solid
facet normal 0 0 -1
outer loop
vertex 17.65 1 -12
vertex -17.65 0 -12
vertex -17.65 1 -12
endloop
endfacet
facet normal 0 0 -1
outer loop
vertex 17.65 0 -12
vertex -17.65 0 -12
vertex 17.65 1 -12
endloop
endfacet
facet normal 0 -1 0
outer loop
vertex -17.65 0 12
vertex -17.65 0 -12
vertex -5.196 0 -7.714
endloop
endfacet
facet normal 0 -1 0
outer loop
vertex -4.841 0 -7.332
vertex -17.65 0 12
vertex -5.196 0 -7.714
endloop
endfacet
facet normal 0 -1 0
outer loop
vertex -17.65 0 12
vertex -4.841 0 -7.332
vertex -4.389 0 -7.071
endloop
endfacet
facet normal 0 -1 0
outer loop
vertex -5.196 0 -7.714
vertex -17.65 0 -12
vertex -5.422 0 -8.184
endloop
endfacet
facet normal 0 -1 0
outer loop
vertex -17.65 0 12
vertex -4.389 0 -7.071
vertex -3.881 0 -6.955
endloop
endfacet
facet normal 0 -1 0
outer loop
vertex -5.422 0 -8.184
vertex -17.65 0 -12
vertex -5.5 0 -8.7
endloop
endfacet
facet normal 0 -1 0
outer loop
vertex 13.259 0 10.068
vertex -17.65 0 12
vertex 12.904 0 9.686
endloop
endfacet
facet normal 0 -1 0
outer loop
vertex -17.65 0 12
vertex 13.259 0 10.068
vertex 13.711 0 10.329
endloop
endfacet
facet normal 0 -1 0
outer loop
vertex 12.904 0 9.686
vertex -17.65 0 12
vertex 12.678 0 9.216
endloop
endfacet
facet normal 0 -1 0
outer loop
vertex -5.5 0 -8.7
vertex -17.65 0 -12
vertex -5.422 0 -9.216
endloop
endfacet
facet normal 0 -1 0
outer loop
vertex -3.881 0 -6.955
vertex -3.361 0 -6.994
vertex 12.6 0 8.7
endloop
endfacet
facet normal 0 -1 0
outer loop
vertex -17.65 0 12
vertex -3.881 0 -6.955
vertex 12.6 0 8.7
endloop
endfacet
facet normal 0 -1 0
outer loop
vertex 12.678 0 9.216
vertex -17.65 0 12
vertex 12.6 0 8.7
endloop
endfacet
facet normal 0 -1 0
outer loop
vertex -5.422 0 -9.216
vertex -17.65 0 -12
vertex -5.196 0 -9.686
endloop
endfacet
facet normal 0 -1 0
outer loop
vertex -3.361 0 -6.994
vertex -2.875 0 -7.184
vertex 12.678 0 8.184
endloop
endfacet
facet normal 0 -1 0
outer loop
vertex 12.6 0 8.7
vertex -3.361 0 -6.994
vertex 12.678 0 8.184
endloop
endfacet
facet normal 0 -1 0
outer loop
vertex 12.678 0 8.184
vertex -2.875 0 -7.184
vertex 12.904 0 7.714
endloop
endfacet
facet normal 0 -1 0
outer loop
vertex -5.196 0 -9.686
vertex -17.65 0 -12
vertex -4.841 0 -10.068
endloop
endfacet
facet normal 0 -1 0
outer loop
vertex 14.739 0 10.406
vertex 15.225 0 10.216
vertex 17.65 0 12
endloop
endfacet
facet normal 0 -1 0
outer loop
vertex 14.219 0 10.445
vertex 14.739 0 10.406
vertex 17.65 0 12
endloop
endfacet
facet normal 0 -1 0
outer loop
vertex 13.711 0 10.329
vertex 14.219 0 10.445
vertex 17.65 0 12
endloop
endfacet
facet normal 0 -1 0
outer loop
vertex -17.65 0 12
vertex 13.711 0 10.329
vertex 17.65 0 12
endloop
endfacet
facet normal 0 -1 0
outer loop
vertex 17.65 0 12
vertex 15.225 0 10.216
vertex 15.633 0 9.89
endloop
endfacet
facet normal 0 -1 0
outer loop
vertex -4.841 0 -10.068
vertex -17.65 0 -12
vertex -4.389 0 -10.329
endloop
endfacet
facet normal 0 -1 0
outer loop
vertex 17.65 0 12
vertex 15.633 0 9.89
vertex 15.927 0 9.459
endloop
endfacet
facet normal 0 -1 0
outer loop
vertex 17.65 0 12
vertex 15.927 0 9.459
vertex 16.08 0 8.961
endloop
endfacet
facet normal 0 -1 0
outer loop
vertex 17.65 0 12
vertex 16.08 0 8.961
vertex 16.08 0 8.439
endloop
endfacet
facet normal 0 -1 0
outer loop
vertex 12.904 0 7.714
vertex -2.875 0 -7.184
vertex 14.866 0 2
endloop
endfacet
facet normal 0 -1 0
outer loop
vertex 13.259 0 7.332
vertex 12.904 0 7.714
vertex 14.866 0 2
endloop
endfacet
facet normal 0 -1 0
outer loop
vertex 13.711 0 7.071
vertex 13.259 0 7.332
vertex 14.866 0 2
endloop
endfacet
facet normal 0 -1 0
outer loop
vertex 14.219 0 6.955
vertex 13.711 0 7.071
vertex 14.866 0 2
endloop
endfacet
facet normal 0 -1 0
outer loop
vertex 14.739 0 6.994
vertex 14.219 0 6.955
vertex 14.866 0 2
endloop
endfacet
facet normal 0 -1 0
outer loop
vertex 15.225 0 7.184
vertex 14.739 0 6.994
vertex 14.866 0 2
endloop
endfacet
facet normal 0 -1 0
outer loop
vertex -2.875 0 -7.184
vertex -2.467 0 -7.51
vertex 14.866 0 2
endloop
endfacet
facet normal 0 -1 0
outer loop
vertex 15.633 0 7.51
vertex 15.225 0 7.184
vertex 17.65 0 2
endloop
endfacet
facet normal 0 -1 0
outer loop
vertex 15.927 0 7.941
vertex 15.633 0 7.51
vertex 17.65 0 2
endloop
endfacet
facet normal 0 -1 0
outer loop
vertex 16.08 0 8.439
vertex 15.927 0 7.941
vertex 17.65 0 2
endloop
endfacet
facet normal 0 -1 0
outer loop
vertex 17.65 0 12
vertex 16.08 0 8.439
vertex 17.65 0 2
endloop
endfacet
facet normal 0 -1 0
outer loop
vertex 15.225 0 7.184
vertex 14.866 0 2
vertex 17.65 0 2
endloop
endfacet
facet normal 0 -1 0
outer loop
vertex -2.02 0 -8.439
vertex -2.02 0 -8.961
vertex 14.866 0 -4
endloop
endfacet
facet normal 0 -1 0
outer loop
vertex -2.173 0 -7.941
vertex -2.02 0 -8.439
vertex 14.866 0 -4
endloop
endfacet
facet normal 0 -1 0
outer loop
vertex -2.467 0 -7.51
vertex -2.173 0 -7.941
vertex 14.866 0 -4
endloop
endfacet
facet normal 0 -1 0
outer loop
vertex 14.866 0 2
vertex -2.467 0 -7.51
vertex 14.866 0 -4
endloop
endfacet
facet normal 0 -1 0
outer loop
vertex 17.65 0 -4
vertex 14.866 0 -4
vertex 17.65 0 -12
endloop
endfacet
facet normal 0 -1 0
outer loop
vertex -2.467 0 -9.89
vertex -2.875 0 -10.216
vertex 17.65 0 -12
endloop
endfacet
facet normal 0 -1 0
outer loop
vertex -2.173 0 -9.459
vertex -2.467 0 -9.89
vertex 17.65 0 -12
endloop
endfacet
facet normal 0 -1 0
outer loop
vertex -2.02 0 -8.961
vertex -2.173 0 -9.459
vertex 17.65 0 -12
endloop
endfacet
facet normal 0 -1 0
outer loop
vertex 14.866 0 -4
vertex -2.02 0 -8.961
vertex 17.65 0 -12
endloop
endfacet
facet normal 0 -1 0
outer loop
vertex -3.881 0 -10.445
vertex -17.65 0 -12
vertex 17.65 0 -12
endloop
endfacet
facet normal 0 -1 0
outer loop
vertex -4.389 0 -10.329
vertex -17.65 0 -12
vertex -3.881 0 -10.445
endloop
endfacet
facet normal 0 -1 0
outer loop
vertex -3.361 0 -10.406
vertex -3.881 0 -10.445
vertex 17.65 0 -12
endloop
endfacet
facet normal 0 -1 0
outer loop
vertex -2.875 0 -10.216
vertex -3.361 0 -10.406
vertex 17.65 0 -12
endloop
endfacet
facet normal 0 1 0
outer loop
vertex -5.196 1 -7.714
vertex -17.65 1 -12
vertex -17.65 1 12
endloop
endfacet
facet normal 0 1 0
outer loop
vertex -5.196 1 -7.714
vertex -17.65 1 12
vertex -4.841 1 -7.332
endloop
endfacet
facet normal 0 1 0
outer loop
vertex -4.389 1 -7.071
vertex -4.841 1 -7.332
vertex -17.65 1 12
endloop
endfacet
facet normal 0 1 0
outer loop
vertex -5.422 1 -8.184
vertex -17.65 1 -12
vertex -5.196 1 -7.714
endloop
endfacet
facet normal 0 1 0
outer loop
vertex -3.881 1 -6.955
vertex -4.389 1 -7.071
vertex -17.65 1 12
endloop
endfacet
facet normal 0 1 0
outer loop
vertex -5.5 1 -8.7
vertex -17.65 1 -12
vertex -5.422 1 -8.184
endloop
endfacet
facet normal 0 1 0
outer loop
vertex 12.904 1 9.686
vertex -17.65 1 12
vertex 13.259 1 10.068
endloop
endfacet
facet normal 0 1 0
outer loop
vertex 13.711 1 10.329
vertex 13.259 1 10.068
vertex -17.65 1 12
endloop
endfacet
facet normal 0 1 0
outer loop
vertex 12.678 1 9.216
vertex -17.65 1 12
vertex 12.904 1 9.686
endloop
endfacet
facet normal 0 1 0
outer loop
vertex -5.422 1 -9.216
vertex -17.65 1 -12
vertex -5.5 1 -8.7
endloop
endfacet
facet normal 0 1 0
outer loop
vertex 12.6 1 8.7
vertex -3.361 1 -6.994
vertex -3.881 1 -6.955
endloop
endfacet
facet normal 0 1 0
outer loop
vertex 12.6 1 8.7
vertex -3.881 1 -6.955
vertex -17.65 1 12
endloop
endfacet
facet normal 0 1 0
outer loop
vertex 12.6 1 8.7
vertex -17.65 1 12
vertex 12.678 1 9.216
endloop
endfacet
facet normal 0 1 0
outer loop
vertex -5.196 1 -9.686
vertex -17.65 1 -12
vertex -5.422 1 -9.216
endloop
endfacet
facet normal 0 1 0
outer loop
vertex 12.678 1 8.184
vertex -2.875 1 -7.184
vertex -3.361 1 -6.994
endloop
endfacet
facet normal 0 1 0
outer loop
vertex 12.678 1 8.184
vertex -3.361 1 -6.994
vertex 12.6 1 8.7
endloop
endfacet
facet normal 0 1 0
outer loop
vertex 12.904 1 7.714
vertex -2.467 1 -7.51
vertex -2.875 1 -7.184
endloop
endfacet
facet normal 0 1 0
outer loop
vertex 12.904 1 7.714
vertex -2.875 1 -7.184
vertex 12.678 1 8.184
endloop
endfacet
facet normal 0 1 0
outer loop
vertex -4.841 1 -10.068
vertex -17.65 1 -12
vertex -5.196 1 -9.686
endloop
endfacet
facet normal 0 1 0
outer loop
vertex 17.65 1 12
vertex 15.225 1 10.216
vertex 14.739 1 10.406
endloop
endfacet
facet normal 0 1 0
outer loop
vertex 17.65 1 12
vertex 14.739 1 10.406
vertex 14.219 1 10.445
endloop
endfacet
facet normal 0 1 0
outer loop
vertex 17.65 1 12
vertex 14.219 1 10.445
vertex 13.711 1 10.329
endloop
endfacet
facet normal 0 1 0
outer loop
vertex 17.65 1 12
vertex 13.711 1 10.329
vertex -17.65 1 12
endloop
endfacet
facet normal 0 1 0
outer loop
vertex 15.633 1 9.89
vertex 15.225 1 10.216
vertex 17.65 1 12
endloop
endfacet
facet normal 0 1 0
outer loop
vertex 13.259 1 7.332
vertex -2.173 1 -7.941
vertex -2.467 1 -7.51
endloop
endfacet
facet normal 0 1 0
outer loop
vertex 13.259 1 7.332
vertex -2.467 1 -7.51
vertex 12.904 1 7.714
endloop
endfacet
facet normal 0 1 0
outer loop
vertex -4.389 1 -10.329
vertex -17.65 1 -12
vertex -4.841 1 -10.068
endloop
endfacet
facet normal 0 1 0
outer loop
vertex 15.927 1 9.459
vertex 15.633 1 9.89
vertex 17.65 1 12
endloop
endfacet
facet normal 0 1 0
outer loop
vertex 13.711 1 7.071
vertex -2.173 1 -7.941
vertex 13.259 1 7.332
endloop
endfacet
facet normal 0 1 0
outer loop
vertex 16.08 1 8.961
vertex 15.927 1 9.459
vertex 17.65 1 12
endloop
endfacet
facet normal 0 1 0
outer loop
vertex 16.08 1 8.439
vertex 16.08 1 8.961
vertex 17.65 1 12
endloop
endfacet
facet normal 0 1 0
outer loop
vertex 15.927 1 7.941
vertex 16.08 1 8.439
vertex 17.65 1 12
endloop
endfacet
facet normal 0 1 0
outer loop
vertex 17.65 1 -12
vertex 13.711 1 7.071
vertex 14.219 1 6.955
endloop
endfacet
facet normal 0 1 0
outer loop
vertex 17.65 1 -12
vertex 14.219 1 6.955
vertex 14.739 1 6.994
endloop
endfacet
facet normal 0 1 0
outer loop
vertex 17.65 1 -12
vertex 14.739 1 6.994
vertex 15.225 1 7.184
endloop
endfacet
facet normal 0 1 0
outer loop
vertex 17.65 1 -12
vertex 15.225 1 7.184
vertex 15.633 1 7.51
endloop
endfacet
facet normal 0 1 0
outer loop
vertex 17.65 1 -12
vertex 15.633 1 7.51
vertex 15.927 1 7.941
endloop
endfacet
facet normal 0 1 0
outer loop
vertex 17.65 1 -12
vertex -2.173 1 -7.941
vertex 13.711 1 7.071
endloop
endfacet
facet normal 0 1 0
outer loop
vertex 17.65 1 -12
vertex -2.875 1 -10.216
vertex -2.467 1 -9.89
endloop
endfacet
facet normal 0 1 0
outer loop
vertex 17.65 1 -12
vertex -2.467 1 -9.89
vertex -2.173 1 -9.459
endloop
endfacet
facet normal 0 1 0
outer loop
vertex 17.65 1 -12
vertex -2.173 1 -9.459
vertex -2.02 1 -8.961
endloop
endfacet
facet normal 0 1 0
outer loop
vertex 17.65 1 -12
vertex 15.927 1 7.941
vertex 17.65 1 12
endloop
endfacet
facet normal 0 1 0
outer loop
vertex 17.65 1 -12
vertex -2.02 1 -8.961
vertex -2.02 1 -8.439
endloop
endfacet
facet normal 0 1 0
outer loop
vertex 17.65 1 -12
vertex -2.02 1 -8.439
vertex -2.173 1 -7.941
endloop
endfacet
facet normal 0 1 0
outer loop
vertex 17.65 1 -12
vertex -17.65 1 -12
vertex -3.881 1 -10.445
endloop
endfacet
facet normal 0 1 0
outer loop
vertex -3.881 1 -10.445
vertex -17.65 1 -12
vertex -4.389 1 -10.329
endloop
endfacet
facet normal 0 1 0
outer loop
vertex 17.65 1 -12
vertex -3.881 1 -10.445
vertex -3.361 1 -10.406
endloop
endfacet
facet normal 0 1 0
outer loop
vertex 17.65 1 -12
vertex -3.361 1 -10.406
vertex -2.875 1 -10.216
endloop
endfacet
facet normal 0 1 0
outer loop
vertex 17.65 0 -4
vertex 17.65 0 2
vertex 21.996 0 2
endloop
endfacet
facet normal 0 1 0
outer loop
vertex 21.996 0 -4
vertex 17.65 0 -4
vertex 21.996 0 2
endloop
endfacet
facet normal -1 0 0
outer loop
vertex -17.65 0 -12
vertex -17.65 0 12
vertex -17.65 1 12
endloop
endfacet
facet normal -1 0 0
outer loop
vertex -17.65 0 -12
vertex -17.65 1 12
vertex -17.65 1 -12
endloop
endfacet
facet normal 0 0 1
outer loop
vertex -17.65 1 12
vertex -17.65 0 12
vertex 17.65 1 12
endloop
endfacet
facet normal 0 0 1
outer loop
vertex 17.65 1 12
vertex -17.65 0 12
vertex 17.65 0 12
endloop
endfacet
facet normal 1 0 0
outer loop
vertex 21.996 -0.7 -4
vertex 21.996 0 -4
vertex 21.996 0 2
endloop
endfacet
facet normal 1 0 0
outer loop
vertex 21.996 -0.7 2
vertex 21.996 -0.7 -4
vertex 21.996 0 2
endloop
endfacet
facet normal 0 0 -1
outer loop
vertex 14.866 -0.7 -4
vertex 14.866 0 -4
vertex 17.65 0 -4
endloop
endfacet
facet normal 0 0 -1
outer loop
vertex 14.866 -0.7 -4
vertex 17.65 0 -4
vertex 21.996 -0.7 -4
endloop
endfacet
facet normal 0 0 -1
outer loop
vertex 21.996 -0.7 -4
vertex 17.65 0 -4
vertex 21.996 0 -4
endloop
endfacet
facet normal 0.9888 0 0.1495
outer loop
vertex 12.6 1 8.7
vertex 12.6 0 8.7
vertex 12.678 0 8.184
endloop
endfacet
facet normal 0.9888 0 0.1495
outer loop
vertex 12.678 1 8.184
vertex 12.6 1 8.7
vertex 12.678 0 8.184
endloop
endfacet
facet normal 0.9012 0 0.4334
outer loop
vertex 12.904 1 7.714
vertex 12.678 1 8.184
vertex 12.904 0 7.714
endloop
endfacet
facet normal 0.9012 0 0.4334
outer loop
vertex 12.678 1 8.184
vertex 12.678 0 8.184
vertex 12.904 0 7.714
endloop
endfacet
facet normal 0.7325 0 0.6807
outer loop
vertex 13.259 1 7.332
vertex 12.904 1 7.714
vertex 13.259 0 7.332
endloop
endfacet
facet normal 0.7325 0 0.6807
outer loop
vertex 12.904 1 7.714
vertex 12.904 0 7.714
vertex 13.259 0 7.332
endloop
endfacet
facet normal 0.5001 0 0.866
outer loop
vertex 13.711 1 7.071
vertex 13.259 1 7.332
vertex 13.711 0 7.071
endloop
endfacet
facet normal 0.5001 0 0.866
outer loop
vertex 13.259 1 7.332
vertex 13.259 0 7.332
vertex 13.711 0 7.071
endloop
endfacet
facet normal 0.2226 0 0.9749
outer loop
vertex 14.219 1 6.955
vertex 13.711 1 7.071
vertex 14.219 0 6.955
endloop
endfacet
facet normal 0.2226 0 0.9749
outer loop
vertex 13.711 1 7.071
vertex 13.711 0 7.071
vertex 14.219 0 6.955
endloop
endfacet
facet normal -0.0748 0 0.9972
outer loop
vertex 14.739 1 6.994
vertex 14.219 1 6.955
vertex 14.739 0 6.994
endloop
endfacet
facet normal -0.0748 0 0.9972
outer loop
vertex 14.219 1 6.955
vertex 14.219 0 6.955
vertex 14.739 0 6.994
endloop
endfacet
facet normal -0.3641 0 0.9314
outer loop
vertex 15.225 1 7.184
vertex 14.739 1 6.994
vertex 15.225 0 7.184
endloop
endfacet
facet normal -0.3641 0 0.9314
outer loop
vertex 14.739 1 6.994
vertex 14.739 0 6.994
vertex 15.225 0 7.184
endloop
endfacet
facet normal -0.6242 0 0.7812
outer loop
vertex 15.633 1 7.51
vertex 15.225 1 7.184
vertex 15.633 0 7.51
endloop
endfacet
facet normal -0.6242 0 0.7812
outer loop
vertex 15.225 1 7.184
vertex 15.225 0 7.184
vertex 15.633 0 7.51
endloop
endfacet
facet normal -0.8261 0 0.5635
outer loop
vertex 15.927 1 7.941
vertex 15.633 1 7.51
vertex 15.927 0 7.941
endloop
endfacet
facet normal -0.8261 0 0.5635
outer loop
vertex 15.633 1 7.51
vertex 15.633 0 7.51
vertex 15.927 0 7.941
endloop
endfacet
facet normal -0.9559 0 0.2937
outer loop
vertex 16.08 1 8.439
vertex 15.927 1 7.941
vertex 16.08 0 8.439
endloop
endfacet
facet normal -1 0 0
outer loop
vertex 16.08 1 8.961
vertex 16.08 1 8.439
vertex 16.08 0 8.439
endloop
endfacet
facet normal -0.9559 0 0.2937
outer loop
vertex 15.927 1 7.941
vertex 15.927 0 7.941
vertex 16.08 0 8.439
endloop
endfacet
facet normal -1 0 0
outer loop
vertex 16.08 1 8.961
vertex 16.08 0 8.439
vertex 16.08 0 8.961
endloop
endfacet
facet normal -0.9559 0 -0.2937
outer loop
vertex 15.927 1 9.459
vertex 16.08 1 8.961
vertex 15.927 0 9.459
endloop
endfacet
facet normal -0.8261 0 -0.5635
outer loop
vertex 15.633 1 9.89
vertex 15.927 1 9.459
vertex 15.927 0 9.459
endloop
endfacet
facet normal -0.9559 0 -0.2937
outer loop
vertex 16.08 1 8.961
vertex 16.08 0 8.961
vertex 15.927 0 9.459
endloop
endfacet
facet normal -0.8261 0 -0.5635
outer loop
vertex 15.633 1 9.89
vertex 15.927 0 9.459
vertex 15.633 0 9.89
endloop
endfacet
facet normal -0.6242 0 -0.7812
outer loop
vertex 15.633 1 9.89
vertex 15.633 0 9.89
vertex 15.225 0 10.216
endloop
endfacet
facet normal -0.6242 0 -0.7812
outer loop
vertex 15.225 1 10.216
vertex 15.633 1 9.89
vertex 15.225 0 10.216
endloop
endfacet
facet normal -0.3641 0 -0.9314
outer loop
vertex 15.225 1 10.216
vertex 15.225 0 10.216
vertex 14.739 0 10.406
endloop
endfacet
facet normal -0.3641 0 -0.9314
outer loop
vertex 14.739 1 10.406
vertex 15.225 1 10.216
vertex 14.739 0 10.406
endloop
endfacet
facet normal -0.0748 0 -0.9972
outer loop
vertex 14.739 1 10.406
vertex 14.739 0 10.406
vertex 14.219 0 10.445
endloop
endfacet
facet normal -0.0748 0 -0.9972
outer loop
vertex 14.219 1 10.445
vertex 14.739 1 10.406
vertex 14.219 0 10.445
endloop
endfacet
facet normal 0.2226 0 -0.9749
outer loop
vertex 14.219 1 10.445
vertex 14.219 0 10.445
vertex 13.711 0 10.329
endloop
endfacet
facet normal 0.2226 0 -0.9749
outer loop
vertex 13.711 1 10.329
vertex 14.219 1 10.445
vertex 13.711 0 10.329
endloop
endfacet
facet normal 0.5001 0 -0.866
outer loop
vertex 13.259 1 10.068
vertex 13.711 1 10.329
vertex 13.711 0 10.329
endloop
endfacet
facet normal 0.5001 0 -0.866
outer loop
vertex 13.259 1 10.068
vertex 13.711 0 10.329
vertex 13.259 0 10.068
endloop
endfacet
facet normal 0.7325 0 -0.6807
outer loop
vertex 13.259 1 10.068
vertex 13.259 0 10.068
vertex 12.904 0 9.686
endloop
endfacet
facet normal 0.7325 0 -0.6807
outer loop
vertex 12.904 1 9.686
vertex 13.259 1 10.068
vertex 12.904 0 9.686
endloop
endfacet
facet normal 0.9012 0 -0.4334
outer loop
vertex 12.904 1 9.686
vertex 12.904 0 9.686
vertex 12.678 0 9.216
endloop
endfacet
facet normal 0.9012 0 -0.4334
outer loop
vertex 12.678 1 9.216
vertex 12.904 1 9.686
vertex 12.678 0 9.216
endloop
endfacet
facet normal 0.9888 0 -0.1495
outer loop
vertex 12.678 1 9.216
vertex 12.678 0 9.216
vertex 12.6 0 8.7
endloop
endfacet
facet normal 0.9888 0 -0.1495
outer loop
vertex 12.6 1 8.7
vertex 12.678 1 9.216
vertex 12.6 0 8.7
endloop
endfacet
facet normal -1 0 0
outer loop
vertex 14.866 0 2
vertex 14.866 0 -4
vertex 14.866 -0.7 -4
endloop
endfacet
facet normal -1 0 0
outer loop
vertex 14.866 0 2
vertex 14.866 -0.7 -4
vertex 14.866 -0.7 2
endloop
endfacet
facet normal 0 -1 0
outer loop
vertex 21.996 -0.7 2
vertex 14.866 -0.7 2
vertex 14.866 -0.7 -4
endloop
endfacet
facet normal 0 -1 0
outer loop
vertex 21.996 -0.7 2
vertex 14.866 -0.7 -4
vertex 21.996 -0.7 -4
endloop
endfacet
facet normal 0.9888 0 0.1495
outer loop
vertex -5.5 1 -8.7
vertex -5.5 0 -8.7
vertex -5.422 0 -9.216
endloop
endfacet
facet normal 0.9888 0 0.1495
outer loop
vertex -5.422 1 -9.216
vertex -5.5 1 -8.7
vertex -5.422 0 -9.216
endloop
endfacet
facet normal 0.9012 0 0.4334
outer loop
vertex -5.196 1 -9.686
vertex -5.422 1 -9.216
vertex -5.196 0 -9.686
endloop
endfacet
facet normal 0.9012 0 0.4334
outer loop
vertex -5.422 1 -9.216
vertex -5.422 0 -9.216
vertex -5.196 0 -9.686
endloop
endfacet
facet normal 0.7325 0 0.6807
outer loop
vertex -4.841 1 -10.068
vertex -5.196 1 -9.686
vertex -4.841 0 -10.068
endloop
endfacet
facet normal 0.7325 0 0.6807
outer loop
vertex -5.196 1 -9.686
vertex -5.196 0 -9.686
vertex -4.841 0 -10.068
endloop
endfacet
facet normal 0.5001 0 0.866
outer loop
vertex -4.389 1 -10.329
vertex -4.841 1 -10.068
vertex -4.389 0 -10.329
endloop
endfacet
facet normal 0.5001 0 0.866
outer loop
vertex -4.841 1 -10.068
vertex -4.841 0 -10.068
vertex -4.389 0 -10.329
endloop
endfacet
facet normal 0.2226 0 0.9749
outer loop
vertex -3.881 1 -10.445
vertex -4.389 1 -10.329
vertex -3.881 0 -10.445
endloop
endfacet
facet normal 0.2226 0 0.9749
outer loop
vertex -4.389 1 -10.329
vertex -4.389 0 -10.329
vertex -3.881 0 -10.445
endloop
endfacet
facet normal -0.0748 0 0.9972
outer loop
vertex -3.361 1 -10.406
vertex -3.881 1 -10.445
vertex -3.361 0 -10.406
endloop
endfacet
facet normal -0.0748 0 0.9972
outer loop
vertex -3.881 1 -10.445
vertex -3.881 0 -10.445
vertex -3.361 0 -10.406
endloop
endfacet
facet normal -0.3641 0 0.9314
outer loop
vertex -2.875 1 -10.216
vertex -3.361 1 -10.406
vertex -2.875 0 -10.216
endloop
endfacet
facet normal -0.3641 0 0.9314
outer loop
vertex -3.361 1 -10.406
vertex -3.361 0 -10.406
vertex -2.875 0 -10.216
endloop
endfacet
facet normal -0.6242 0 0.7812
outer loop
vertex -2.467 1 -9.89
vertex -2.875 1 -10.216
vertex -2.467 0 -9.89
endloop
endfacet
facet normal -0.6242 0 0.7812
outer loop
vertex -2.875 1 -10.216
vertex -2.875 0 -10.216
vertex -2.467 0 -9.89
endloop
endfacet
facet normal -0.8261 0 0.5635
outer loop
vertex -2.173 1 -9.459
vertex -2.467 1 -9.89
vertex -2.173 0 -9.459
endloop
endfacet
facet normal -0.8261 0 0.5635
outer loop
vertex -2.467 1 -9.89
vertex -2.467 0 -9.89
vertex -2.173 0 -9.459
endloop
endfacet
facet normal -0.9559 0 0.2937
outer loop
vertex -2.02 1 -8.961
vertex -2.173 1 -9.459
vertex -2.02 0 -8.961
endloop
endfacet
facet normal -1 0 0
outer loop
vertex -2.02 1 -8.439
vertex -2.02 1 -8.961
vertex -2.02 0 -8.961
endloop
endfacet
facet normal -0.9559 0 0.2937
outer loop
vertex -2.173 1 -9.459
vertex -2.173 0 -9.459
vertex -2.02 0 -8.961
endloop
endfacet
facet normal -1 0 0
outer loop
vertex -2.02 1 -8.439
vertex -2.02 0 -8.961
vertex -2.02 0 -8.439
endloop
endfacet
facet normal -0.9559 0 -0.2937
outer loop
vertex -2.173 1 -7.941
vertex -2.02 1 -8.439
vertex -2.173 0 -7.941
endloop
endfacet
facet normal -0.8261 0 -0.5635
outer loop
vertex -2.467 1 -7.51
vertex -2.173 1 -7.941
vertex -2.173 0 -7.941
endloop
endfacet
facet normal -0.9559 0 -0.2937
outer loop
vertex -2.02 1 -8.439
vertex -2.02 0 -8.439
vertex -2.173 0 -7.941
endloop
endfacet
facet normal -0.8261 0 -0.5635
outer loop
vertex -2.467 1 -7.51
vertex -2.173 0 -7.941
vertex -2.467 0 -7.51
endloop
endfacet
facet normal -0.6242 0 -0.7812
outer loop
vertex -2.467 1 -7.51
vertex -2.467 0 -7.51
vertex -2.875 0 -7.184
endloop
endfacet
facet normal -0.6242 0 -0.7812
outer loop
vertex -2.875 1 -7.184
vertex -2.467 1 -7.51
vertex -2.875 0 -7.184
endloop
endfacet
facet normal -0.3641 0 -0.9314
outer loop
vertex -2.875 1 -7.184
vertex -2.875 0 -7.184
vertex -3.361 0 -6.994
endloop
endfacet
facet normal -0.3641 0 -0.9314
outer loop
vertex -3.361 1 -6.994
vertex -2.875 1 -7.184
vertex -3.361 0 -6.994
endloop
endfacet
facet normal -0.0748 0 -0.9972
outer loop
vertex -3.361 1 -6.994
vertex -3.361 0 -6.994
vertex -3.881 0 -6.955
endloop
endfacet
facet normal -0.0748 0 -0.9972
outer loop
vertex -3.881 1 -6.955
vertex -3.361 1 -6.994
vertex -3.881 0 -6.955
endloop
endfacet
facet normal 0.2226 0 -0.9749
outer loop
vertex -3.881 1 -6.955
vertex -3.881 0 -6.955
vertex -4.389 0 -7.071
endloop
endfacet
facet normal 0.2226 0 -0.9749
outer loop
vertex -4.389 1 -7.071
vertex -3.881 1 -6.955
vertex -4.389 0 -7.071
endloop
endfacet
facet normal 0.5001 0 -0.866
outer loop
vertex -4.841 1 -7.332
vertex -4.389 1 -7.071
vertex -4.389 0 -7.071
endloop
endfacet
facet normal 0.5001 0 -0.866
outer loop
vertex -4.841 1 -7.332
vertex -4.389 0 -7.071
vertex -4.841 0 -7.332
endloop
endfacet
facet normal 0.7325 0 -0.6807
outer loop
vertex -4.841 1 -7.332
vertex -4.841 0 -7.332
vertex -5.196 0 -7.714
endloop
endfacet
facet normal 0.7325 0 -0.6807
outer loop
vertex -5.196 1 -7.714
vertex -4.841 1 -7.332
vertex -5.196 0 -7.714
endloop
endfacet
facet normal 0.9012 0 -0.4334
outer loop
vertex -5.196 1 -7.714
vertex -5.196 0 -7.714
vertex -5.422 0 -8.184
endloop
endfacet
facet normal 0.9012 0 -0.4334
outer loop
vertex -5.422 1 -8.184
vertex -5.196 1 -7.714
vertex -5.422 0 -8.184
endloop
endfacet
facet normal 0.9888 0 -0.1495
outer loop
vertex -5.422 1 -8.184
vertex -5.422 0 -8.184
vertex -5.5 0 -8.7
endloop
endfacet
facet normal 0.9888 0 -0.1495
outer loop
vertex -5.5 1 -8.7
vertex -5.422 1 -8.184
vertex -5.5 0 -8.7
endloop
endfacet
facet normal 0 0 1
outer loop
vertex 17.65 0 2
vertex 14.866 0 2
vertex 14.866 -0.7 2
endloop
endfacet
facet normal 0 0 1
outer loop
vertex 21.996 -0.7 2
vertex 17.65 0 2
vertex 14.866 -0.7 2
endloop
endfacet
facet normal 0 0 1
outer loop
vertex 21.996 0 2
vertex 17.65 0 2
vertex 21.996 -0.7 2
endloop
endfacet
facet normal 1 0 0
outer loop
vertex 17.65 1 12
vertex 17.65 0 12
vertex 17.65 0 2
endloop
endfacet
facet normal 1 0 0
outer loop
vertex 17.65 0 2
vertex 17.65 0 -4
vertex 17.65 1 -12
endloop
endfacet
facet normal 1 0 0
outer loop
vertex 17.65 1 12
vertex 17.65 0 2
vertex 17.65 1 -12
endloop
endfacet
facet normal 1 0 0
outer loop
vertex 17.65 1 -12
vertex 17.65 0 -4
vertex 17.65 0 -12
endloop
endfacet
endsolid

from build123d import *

# Parameters (mm, degrees)
SKETCH1_W                  = 35.3
SKETCH1_H                  = 24
BOSS_EXTRUDE1_DEPTH        = 1
F_3_5_3_5_DIAMETER_HOLE1_D = 3.5
SKETCH5_W                  = 7.129651431
SKETCH5_H                  = 6
BOSS_EXTRUDE2_DEPTH        = 0.7


with BuildPart() as part:
    # Sketch1 → Boss-Extrude1 (new body)
    with BuildSketch(Plane(origin=(0, 0, 0), x_dir=(1, 0, 0), z_dir=(0, 1, 0))):
        Rectangle(SKETCH1_W, SKETCH1_H)
    extrude(amount=BOSS_EXTRUDE1_DEPTH)

    # Ø3.5 (3.5) Diameter Hole1 (through all)
    with Locations(Plane(origin=(0, 1, 0), x_dir=(1, 0, 0), z_dir=(0, 1, 0))):
        with Locations((-3.75, 8.7), (14.35, -8.7)):
            Hole(F_3_5_3_5_DIAMETER_HOLE1_D / 2)

    # Sketch5 → Boss-Extrude2 (add)
    with BuildSketch(Plane.XZ):
        with Locations((18.431222248, -1)):
            Rectangle(SKETCH5_W, SKETCH5_H)
    extrude(amount=BOSS_EXTRUDE2_DEPTH)


solid = part.part
